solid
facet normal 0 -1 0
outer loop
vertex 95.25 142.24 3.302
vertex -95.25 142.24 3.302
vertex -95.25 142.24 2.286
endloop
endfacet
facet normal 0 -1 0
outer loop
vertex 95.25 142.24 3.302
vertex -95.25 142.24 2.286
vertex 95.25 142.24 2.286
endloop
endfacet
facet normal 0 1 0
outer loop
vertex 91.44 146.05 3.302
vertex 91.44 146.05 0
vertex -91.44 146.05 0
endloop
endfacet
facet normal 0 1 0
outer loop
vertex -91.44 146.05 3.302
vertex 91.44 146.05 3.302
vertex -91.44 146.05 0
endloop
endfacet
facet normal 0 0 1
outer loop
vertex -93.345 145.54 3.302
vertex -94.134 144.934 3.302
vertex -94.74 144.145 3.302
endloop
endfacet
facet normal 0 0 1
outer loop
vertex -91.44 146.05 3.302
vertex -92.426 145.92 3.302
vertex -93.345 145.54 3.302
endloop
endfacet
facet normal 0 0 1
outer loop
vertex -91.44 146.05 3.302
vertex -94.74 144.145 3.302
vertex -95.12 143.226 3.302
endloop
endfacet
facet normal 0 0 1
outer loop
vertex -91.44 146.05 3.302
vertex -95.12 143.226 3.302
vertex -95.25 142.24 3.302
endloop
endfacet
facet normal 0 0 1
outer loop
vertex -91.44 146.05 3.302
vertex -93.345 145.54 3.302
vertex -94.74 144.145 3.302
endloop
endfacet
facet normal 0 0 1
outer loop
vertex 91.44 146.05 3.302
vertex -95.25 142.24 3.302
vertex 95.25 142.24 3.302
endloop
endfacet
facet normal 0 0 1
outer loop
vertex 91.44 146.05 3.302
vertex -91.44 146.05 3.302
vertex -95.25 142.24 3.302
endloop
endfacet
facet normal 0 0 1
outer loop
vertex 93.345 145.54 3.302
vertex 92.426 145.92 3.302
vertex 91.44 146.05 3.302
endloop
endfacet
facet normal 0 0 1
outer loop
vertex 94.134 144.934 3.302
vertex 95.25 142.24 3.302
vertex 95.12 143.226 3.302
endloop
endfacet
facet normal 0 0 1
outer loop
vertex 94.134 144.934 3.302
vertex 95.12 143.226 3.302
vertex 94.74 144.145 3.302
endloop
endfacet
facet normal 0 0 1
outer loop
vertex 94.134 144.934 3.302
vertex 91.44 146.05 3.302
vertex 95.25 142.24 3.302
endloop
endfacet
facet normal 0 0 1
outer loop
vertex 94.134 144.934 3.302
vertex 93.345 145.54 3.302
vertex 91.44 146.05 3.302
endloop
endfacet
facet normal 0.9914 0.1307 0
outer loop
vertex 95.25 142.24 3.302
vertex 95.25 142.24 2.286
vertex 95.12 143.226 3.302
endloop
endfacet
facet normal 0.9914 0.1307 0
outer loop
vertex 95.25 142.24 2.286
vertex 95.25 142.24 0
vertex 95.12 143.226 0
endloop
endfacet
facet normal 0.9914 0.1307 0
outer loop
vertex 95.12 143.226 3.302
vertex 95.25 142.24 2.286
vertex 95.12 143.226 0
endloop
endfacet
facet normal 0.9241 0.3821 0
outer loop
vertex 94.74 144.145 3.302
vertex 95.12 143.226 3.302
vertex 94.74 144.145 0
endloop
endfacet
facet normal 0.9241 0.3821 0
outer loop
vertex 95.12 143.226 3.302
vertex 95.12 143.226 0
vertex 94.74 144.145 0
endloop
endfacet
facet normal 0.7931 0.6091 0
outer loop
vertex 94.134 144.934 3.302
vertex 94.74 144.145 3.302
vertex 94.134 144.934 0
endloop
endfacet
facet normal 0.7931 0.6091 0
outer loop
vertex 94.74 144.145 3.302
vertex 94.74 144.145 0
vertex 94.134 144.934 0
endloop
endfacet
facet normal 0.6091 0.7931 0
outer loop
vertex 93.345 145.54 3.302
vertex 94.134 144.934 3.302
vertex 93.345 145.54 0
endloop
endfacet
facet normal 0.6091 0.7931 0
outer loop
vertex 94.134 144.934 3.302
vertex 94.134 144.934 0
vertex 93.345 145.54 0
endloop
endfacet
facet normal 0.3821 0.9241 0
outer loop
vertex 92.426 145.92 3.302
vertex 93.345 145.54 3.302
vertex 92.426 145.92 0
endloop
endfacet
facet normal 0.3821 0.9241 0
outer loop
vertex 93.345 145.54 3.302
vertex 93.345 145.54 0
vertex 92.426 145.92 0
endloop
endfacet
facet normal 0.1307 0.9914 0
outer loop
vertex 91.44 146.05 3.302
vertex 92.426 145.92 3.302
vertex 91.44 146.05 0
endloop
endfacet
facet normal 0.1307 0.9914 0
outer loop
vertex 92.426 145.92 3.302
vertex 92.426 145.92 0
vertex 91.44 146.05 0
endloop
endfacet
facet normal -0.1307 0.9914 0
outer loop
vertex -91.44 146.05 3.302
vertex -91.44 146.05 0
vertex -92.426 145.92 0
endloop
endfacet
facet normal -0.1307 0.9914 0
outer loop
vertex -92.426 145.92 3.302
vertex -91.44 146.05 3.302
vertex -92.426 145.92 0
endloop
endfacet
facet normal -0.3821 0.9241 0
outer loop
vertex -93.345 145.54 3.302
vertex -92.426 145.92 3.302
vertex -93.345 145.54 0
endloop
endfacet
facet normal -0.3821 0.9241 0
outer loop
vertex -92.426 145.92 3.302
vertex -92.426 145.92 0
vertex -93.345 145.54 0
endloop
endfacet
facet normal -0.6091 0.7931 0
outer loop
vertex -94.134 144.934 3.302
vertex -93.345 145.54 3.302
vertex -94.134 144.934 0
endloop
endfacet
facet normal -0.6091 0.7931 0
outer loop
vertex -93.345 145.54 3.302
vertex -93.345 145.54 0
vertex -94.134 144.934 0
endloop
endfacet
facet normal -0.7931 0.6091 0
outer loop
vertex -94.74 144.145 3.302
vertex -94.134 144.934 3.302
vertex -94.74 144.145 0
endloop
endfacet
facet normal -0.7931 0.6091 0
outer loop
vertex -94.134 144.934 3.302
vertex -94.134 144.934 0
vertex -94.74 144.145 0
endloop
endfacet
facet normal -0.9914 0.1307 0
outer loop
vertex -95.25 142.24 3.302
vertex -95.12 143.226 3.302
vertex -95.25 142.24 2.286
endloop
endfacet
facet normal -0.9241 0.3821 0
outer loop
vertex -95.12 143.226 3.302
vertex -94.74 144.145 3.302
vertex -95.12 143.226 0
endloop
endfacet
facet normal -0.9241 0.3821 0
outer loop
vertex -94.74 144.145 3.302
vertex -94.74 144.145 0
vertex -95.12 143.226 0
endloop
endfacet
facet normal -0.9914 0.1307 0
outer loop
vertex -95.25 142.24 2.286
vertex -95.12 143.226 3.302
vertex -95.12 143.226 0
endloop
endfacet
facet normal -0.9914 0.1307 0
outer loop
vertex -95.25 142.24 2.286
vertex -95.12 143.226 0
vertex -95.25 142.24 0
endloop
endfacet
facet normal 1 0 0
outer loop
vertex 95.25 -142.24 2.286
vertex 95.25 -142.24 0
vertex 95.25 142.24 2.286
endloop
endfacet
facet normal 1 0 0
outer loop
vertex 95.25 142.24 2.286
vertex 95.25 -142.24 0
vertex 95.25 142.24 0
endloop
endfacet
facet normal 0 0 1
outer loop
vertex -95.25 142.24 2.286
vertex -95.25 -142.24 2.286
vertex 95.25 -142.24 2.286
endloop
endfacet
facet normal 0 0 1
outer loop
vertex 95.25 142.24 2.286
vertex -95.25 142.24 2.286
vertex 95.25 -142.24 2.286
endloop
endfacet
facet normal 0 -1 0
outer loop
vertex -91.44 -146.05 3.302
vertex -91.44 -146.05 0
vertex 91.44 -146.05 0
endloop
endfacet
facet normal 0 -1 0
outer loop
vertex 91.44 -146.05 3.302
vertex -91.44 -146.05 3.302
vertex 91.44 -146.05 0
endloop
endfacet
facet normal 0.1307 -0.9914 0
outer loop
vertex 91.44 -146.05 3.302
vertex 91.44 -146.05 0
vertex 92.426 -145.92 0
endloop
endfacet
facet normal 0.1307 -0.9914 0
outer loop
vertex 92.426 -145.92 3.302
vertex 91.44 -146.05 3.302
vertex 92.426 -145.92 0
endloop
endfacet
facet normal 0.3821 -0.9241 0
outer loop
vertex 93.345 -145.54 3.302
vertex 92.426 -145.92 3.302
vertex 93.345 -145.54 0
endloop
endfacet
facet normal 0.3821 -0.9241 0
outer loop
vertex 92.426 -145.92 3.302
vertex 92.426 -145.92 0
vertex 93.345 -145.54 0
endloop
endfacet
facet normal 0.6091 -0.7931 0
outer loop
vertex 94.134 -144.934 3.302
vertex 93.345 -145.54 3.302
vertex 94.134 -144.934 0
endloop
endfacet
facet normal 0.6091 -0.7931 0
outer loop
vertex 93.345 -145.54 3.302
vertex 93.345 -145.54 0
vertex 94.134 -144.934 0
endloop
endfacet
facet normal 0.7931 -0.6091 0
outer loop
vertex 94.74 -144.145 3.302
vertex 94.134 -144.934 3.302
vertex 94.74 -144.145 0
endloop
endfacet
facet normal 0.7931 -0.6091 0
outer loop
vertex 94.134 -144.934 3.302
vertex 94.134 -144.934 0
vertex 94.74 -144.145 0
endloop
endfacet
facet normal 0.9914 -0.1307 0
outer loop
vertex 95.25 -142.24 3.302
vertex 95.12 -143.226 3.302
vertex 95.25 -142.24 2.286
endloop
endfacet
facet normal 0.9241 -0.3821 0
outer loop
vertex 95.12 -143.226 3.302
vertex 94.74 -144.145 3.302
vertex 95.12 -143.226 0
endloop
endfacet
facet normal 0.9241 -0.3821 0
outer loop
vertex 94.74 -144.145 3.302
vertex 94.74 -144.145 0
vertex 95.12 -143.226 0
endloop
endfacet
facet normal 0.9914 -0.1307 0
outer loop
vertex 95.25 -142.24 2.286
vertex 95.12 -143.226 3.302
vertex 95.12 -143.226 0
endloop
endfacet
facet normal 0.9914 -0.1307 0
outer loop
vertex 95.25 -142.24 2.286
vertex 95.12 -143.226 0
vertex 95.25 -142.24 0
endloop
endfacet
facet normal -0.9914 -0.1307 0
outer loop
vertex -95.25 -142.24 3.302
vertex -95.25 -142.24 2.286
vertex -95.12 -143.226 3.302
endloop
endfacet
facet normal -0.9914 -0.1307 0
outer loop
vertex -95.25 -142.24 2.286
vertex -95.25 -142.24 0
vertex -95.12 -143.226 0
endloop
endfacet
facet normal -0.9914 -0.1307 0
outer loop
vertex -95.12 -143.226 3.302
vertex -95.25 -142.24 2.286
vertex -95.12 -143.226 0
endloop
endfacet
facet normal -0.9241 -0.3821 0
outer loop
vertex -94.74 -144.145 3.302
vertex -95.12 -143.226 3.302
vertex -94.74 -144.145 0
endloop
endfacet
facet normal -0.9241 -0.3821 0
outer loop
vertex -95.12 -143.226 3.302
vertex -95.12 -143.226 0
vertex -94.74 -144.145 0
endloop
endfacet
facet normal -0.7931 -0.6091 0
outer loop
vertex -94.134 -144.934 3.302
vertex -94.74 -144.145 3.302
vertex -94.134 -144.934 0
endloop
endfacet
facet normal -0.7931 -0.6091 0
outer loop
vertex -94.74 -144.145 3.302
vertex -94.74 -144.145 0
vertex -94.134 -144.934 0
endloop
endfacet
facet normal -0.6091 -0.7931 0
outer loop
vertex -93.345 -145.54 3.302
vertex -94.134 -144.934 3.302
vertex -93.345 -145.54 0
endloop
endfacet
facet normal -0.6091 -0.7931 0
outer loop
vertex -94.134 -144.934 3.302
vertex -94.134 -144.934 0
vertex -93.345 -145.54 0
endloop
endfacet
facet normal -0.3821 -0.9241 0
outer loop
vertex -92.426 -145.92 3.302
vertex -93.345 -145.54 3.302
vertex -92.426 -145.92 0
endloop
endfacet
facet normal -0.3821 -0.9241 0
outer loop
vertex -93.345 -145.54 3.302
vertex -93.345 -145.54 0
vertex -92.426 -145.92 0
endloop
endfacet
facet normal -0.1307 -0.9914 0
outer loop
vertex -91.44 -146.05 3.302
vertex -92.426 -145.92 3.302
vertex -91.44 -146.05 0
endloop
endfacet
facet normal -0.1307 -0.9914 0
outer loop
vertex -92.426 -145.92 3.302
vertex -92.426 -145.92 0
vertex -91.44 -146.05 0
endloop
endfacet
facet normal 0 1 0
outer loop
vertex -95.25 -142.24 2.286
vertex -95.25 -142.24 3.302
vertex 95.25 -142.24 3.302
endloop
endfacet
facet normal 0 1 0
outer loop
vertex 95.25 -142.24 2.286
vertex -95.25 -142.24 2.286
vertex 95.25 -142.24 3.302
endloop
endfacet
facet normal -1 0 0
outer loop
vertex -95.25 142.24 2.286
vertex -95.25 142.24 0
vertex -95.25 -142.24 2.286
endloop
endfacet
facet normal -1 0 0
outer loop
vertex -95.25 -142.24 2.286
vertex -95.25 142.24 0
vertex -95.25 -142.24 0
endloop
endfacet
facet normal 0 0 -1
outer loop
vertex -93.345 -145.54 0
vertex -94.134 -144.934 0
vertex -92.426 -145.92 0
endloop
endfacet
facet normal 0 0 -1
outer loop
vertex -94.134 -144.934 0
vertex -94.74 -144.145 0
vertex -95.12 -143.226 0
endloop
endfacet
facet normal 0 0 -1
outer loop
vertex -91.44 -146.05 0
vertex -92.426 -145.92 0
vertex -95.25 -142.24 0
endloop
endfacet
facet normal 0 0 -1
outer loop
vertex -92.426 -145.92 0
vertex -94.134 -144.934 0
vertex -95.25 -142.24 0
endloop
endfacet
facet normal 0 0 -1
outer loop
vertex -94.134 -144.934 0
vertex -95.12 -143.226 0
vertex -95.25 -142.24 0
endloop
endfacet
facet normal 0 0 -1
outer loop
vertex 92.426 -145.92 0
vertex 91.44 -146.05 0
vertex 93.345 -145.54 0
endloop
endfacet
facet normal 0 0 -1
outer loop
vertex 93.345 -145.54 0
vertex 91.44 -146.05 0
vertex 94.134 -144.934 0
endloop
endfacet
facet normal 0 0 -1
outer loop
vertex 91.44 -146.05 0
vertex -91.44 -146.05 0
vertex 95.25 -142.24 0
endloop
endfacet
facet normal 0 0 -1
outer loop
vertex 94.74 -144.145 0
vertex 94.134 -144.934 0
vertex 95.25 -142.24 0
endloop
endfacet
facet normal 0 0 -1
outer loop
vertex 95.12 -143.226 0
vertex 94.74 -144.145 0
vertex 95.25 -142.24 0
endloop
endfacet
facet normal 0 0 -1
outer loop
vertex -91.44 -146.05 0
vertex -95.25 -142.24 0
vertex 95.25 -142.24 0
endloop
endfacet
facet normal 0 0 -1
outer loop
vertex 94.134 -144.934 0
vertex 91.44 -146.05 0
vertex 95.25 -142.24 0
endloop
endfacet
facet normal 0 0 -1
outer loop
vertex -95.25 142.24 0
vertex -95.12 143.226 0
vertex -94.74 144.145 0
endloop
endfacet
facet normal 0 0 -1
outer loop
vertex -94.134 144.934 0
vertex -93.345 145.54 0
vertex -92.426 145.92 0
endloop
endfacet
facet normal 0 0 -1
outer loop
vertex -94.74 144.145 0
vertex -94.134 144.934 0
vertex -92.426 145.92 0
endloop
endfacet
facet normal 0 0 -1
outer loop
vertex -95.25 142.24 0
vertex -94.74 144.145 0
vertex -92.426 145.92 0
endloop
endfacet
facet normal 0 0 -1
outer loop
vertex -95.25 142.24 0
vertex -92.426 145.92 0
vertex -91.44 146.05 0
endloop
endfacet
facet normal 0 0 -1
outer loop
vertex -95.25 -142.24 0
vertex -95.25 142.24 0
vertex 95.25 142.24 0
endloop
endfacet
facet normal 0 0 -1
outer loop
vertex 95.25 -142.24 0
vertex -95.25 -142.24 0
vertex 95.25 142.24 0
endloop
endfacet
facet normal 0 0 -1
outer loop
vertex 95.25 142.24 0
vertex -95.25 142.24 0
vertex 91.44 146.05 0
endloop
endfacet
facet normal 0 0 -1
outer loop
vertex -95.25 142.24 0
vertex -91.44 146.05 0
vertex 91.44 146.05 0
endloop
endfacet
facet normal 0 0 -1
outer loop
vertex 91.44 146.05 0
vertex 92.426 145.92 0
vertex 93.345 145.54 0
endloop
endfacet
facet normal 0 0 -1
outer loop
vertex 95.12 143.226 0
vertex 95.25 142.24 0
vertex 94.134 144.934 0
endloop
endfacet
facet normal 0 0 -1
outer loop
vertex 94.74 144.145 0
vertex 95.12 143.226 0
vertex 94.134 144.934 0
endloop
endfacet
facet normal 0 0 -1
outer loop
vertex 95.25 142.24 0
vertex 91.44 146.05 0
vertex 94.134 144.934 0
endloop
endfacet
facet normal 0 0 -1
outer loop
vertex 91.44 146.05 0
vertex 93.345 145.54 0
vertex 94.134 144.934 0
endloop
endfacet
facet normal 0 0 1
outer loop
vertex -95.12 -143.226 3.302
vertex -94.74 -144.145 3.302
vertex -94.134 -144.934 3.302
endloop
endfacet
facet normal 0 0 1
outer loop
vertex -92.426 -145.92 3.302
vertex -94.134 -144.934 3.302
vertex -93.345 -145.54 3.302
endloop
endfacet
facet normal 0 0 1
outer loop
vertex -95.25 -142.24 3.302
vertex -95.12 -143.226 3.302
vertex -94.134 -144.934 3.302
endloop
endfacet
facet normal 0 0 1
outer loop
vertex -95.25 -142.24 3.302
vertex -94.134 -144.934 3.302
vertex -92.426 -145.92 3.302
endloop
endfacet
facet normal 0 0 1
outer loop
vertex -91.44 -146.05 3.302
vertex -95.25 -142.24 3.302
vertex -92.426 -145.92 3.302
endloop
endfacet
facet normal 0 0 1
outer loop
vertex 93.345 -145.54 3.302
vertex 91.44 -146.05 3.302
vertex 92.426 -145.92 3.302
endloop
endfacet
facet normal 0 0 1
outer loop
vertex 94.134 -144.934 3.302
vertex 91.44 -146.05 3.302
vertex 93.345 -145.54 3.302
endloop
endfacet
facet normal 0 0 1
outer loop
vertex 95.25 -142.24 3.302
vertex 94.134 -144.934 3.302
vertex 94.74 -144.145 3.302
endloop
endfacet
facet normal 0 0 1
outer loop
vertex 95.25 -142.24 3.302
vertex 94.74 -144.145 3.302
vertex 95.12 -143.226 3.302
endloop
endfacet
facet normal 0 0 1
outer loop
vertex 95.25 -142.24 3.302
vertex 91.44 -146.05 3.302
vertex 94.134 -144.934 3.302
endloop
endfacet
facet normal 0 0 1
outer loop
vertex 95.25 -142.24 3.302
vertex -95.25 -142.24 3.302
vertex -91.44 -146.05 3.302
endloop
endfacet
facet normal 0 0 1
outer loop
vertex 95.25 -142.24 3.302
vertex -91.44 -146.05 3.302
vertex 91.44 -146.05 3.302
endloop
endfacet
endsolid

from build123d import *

# Parameters (mm, degrees)
F1_DEPTH = 3.302
F2_W     = 190.5
F2_H     = 284.48
F3_DEPTH = 1.016


with BuildPart() as f1:
    # F0 (on Top) → F1 (new body)
    with BuildSketch(Plane.XY):
        with BuildLine():
            Line((91.44, 146.05), (-91.44, 146.05))
            ThreePointArc((-91.44, 146.05), (-94.134077, 144.934077), (-95.25, 142.24))
            Line((-95.25, 142.24), (-95.25, -142.24))
            ThreePointArc((-95.25, -142.24), (-94.134077, -144.934077), (-91.44, -146.05))
            Line((-91.44, -146.05), (91.44, -146.05))
            ThreePointArc((91.44, -146.05), (94.134077, -144.934077), (95.25, -142.24))
            Line((95.25, -142.24), (95.25, 142.24))
            ThreePointArc((95.25, 142.24), (94.134077, 144.934077), (91.44, 146.05))
        make_face()
    extrude(amount=F1_DEPTH)

    # F2 (on face) → F3 (cut)
    with BuildSketch(Plane.XY.offset(3.302)):
        Rectangle(F2_W, F2_H)
    extrude(amount=-F3_DEPTH, mode=Mode.SUBTRACT)


solid = f1.part
